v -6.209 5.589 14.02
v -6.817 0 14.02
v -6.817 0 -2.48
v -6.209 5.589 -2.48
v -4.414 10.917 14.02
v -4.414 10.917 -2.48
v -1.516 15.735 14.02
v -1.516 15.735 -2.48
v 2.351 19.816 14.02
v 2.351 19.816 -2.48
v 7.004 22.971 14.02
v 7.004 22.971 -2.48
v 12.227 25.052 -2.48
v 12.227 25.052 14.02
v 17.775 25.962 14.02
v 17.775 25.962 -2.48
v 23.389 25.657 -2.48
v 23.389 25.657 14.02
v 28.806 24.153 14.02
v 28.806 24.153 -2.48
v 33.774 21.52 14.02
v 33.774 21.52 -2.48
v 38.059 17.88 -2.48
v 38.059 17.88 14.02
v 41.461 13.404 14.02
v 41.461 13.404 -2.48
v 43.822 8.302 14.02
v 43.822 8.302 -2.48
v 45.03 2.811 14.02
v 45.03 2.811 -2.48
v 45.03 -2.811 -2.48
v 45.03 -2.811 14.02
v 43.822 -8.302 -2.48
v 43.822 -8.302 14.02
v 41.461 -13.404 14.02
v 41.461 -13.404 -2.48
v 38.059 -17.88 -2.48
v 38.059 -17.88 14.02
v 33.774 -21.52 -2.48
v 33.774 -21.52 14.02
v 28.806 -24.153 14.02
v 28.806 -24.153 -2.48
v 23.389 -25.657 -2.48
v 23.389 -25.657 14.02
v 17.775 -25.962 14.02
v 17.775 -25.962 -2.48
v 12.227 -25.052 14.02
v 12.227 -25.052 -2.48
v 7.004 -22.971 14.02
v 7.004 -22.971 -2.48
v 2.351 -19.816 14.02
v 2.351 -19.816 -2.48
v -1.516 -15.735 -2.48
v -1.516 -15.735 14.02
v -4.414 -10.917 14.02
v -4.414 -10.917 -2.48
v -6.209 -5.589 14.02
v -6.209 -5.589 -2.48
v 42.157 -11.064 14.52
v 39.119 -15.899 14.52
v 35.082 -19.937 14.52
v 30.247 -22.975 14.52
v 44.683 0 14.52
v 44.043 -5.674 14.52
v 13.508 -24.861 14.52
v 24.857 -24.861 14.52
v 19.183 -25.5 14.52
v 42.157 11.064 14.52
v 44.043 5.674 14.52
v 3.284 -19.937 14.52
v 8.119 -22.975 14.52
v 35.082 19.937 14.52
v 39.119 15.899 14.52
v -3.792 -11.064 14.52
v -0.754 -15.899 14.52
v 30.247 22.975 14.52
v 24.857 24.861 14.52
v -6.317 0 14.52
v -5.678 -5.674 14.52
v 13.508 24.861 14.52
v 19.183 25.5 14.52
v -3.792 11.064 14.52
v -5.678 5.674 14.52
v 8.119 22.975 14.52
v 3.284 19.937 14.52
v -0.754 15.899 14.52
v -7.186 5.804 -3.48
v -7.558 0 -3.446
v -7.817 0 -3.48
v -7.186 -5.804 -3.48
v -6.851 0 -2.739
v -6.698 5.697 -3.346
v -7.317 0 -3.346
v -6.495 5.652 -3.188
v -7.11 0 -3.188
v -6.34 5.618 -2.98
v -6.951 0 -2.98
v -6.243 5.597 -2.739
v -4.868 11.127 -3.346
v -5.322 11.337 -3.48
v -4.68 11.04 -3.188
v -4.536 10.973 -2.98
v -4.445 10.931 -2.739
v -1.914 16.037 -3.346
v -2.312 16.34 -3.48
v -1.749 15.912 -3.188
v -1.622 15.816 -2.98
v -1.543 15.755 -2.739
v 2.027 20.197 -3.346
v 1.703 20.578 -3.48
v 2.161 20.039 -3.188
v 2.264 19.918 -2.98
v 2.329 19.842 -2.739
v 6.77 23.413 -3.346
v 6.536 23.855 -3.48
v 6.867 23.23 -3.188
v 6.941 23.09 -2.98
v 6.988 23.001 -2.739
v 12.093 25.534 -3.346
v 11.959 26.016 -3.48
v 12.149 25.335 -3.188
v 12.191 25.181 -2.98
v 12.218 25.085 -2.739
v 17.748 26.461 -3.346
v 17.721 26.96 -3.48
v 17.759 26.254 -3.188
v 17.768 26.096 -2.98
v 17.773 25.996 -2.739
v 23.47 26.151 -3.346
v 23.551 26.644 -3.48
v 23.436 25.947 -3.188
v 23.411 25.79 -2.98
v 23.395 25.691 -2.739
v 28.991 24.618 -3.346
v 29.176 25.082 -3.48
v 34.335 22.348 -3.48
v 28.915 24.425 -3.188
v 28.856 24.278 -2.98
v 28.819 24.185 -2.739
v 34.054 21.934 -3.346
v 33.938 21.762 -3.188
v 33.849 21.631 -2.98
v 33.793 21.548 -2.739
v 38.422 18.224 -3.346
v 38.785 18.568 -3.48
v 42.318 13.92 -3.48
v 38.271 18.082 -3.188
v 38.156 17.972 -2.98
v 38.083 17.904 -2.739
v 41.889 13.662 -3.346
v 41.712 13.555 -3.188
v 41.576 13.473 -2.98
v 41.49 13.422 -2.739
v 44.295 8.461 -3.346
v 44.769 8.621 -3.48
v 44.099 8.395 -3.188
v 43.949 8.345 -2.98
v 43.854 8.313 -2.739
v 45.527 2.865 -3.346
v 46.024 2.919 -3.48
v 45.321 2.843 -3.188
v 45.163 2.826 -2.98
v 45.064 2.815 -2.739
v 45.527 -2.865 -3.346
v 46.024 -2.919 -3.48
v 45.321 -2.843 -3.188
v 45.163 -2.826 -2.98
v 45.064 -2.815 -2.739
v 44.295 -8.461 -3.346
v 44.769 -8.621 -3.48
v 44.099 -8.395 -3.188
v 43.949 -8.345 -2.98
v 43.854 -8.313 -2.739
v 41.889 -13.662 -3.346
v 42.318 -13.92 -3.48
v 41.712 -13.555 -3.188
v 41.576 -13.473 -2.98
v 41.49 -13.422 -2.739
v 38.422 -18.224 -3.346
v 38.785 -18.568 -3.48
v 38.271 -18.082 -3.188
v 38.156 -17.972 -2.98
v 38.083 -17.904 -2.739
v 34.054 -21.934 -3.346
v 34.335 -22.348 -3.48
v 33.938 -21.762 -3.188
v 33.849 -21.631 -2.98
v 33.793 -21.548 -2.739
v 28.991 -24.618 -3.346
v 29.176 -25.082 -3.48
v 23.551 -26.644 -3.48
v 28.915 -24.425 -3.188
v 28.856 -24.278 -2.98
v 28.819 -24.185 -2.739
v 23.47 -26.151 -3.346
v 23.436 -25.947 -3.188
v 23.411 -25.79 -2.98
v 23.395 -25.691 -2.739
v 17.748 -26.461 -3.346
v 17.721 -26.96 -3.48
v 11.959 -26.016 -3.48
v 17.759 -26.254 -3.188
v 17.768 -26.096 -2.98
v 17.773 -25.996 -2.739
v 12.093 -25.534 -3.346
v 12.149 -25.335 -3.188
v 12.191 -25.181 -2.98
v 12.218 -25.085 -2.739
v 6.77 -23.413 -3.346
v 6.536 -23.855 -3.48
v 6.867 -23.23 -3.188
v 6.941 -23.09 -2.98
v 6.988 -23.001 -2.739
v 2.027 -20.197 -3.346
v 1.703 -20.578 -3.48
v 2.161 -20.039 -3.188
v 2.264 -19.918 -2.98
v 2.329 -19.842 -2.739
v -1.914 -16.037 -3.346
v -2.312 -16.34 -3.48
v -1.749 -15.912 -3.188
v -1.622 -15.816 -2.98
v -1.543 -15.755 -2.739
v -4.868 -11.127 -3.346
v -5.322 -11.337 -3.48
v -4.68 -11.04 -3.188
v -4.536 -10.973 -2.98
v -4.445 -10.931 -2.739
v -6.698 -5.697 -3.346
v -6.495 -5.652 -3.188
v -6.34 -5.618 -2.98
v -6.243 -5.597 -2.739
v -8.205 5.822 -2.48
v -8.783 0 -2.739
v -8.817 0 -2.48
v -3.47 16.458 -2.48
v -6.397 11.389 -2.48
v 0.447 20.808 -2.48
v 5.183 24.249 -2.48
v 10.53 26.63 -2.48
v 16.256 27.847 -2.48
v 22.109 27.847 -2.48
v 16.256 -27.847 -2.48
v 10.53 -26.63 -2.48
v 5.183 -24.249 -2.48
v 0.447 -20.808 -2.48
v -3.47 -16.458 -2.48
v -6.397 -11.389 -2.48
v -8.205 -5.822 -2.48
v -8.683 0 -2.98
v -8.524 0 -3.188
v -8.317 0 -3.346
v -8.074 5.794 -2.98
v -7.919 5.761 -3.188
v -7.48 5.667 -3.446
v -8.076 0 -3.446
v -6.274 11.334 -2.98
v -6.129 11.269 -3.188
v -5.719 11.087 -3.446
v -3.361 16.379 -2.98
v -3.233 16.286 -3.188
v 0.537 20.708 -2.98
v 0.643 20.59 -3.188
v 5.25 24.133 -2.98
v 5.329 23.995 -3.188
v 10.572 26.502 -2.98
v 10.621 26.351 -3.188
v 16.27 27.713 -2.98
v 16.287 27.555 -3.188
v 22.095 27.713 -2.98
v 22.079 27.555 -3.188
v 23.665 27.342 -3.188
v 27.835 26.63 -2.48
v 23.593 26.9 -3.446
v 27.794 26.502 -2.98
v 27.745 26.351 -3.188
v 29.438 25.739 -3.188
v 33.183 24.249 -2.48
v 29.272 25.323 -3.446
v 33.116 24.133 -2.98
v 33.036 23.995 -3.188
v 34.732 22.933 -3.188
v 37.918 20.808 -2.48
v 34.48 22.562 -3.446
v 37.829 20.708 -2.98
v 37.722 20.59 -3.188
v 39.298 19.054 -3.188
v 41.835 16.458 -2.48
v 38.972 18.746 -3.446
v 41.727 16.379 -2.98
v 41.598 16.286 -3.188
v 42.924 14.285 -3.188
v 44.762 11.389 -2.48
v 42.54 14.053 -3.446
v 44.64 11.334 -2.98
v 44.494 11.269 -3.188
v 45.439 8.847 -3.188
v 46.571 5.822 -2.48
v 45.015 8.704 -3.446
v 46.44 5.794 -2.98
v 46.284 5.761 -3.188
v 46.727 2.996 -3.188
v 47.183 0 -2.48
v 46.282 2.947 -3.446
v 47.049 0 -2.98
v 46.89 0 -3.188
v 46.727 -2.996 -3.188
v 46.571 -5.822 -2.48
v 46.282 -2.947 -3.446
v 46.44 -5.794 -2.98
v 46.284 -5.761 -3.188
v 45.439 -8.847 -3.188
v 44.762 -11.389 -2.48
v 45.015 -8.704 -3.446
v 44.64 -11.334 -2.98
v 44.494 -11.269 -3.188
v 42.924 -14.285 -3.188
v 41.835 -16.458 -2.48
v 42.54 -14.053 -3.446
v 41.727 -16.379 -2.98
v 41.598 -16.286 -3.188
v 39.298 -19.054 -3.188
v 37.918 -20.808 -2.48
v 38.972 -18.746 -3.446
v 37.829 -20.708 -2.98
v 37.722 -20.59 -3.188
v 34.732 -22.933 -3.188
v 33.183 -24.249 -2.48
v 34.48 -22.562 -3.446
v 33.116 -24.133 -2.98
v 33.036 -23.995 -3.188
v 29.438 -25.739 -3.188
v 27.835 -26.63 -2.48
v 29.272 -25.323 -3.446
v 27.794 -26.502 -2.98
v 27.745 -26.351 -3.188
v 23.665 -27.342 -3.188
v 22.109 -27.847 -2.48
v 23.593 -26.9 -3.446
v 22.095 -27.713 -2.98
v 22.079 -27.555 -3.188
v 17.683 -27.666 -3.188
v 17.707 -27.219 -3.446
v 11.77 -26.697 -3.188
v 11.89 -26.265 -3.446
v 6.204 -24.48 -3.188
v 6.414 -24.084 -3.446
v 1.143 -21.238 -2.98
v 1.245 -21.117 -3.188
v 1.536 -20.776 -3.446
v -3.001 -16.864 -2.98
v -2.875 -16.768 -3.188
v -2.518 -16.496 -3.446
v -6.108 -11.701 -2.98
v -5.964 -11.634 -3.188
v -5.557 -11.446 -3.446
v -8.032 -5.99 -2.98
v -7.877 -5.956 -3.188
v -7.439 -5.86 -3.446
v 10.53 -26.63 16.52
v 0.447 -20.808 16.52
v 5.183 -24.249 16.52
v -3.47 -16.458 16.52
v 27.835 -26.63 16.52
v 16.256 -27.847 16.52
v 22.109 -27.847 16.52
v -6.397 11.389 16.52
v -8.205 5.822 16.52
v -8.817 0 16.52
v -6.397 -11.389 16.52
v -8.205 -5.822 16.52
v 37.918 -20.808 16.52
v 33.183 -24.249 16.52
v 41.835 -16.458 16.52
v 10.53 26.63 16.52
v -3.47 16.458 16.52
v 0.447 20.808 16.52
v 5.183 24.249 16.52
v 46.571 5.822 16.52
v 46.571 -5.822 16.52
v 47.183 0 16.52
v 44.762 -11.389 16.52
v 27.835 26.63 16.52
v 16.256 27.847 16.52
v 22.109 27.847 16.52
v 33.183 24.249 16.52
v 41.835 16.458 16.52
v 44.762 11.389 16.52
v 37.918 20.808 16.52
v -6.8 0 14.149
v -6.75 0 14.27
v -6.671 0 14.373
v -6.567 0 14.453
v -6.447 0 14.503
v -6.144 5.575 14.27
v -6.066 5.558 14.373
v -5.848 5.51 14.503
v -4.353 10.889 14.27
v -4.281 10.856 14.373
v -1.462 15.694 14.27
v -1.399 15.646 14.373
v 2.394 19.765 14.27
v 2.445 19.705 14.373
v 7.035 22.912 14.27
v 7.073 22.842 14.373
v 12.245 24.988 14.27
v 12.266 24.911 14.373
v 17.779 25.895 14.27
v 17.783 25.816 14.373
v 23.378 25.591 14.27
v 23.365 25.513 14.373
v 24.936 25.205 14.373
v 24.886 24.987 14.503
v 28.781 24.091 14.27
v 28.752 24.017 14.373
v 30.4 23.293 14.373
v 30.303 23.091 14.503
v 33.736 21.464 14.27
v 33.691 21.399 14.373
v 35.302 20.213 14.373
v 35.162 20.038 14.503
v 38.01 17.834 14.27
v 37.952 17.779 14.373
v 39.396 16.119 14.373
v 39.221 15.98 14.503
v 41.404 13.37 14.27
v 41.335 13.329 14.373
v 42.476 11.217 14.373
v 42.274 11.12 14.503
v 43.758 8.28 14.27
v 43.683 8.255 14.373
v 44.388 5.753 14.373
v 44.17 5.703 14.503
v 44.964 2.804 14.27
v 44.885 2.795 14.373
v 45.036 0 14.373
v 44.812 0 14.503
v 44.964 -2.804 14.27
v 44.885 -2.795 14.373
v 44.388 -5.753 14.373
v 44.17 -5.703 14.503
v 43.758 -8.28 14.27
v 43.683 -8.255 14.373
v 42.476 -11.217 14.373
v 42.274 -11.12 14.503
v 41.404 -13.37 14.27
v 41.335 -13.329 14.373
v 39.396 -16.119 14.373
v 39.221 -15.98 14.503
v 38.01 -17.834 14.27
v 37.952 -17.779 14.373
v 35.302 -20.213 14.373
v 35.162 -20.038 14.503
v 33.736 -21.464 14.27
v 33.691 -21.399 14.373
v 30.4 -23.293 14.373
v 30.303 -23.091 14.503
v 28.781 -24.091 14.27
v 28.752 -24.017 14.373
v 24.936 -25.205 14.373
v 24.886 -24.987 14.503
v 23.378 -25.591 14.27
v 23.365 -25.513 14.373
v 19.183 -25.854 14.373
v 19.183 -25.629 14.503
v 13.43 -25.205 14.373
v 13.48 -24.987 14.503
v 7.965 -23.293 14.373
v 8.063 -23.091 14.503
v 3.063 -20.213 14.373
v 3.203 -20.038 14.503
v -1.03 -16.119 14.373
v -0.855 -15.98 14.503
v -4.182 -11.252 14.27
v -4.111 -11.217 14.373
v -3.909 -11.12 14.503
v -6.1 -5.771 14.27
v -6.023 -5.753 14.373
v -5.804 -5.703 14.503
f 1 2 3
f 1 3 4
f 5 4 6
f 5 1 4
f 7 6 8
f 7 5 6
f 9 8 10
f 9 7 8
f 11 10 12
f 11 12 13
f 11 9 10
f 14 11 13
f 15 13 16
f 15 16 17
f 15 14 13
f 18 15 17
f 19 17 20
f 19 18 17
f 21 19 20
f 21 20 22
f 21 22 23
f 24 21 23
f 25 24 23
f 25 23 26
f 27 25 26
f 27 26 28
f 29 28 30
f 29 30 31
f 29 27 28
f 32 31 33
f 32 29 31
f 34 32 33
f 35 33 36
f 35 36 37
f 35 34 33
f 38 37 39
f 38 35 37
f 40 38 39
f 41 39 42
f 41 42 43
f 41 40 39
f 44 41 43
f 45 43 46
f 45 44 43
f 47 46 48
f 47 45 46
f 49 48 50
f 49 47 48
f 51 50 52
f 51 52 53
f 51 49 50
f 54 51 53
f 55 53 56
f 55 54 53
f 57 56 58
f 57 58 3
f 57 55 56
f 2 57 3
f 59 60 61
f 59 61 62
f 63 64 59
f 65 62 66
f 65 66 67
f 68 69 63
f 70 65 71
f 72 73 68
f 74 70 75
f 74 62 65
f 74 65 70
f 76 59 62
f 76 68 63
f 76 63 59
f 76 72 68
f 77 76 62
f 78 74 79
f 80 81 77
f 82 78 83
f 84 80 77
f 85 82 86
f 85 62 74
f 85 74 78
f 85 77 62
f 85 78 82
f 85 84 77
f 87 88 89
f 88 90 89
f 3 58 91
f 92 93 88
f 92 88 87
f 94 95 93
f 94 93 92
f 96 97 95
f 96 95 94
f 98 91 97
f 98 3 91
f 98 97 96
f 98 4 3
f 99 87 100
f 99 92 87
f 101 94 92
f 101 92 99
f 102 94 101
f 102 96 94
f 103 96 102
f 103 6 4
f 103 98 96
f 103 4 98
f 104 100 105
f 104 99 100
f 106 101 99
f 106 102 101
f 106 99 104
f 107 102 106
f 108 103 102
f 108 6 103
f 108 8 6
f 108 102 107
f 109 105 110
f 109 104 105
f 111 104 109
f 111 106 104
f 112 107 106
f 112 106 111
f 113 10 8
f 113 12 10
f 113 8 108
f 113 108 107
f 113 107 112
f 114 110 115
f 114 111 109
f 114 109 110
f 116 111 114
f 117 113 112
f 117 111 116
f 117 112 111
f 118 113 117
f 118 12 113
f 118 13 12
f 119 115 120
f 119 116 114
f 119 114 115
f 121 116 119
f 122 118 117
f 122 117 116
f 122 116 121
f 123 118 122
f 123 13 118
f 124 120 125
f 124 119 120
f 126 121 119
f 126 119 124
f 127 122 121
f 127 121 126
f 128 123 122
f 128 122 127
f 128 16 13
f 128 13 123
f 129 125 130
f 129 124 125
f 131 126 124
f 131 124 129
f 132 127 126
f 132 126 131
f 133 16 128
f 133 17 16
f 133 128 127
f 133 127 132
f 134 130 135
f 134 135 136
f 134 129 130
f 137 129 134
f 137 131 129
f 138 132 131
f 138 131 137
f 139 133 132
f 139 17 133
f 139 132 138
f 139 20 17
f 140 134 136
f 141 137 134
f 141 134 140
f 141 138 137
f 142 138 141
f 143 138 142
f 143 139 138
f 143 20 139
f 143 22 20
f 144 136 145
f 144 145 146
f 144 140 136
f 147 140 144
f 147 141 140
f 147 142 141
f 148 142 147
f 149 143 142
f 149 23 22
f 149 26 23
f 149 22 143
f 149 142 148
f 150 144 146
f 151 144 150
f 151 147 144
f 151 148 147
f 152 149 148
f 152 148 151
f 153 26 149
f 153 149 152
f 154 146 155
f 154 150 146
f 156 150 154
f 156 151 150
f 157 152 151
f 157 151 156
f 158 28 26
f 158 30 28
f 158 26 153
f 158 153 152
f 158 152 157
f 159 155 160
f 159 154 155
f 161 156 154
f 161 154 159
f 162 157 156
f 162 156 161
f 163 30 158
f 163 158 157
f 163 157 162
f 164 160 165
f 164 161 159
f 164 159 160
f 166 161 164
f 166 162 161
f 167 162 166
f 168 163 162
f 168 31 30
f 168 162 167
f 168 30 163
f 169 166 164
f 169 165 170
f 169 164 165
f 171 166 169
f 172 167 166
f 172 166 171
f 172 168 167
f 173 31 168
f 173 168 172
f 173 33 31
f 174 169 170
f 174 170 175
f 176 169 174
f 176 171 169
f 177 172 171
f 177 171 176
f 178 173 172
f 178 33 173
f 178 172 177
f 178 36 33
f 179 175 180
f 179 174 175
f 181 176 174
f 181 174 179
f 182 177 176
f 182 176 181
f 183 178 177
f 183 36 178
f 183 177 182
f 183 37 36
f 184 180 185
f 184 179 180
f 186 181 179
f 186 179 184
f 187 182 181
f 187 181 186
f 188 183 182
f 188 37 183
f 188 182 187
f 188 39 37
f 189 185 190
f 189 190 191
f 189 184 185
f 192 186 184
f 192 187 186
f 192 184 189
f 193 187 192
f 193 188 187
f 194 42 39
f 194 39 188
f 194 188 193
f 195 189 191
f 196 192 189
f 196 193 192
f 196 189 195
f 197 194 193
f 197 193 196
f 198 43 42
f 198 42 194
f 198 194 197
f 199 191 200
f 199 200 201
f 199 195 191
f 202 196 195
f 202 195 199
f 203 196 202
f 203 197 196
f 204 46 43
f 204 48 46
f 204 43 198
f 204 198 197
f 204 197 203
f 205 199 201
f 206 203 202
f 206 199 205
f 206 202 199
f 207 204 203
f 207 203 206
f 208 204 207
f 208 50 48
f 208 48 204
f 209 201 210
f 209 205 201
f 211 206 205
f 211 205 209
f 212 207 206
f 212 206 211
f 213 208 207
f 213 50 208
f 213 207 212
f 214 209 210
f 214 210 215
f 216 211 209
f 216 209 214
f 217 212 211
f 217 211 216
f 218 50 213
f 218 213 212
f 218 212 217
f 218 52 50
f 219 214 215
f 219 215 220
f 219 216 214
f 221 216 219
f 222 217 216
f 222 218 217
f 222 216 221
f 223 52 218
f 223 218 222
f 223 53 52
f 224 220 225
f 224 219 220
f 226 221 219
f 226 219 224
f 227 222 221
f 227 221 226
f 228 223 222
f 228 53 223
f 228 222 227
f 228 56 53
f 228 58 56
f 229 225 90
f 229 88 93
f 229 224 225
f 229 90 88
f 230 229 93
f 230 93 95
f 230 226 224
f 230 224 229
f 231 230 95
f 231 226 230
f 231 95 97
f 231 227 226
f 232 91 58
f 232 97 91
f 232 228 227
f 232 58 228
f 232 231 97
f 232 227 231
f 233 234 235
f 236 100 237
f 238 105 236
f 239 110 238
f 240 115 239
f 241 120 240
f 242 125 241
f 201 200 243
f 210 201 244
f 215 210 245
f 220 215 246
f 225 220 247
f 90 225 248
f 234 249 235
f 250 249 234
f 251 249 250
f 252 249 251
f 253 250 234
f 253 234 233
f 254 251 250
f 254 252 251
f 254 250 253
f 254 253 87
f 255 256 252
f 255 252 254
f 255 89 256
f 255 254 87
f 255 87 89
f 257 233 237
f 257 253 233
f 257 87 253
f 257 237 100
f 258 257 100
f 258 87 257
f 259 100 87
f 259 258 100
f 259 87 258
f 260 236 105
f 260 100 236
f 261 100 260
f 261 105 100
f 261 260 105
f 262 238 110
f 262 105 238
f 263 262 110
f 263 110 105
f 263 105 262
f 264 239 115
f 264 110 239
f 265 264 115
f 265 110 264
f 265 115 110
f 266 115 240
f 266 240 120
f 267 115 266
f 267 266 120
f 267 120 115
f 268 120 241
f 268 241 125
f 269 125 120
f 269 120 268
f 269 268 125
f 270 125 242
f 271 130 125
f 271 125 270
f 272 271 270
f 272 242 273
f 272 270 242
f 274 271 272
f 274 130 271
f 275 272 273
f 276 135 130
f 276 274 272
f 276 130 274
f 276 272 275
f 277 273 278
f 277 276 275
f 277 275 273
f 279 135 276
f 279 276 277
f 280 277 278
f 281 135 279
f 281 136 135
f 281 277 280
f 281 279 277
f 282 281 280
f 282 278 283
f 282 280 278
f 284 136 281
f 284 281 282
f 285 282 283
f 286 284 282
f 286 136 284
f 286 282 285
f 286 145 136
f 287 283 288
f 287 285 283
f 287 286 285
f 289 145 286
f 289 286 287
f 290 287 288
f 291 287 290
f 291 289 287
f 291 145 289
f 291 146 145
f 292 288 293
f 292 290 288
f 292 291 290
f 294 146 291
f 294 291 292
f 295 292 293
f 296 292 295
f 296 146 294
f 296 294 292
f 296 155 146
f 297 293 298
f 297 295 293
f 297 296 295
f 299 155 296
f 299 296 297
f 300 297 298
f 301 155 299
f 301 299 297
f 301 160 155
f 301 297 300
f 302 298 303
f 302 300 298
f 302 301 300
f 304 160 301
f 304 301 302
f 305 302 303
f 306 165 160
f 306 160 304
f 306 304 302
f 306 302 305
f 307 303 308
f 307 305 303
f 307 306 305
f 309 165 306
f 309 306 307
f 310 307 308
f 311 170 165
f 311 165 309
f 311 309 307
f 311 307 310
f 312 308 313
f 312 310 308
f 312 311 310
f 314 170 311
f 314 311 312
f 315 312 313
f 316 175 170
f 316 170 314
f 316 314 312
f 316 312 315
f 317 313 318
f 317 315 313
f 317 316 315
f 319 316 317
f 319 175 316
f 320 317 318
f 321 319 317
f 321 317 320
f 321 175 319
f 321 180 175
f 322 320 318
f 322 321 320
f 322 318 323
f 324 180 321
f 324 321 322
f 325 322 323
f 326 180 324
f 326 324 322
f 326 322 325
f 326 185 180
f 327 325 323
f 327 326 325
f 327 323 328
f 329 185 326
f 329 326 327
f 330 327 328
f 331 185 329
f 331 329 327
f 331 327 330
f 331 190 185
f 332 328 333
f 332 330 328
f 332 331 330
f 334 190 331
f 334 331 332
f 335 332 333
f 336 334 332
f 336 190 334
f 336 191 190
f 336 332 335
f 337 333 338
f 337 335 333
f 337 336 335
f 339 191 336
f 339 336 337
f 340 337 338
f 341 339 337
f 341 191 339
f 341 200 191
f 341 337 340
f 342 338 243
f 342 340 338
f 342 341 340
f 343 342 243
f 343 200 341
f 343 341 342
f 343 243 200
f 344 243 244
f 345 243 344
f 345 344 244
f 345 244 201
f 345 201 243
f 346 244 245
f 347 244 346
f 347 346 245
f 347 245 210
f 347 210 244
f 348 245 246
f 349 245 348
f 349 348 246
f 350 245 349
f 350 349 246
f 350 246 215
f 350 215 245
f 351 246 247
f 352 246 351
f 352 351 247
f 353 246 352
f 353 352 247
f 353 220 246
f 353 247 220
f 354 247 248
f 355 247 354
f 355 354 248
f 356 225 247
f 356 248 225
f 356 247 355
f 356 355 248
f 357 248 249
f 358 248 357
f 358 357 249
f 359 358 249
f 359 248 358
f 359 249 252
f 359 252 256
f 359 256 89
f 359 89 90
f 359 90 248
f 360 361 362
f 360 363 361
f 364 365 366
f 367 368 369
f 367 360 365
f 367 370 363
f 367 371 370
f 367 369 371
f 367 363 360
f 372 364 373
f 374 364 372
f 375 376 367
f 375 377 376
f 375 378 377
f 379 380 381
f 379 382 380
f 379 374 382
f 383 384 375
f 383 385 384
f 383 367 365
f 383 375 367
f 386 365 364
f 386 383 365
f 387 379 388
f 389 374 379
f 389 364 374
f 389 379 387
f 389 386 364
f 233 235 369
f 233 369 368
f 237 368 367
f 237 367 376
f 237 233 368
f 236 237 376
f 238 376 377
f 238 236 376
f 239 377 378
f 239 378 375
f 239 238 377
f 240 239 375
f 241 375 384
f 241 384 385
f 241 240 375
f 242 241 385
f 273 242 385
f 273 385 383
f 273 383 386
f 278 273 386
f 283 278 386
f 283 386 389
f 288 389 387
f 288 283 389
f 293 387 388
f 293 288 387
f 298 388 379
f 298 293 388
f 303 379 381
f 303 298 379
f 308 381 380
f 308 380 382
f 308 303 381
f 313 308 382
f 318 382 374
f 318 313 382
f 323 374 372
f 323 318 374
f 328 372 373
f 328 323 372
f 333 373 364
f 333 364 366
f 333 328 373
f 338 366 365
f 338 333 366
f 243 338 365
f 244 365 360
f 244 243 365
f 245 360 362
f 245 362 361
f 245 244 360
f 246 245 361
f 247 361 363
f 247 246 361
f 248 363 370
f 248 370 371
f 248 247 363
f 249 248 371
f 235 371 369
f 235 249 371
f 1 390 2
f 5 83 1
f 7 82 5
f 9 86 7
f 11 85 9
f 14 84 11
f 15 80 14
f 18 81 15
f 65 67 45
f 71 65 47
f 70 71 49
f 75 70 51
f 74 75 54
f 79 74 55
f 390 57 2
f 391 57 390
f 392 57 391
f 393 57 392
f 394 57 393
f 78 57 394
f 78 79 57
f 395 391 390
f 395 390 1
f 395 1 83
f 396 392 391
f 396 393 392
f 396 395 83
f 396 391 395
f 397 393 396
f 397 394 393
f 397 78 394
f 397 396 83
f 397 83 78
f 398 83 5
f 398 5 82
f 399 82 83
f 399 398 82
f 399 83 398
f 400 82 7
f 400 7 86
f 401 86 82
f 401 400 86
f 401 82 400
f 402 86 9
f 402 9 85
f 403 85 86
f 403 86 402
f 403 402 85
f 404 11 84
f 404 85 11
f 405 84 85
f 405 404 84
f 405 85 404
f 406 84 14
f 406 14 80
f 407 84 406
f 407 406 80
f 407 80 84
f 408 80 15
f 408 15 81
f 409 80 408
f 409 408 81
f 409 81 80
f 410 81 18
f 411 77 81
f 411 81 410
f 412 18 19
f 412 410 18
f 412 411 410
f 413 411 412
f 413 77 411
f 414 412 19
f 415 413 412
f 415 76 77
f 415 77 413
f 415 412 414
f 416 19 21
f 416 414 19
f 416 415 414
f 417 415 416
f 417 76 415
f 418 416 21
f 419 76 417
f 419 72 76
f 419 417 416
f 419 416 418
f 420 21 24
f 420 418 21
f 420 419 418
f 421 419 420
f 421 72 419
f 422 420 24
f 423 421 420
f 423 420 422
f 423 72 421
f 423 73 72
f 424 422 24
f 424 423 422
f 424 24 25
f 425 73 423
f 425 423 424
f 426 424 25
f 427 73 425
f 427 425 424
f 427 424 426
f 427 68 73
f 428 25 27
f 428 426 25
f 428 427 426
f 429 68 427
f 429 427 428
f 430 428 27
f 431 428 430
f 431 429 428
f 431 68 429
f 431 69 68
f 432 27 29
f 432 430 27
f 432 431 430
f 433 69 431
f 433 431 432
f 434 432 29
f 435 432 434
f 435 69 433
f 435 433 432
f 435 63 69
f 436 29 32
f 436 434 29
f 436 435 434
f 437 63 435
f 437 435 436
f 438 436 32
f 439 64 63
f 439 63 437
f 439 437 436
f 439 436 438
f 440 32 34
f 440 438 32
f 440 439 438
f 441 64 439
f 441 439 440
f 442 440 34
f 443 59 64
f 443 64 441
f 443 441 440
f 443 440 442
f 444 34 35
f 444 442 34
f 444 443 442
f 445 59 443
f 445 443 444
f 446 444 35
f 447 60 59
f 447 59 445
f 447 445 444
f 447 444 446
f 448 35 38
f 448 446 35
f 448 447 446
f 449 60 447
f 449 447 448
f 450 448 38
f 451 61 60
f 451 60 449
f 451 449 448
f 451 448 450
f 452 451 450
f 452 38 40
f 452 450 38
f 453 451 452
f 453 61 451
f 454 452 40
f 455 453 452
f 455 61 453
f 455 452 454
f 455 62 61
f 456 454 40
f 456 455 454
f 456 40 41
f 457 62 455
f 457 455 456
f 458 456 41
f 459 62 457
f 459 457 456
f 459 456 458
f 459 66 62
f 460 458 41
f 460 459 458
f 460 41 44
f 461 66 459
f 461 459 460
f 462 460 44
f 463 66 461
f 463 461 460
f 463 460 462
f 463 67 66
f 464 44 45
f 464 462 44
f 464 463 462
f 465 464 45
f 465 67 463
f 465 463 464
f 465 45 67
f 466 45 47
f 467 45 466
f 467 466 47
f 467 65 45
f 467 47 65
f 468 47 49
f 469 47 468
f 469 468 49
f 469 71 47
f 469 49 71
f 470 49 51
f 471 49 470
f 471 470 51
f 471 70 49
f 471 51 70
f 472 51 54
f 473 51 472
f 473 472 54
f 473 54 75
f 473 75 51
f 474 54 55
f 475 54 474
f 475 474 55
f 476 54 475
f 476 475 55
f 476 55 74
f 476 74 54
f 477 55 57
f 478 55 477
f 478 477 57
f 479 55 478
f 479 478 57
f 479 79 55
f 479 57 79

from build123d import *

# Parameters (mm, degrees)
F2_R = 0.99999
F3_R = 0.5


# Not quite as in the source:
# - a fillet or chamfer is up to 0.001 mm smaller than in the source, because OpenCascade refuses the exact size


with BuildPart() as f1:
    # F0 (on Front) → F1 (revolve)
    with BuildSketch(Plane.XZ):
        Polygon((19.1826918498, 16.5195801589), (-8.8173081502, 16.5195801589), (-8.8173081502, -3.4804198411), (-6.8173081502, -3.4804198411), (-6.8173081502, 14.5195801589), (19.1826918498, 14.5195801589), align=None)
    revolve(axis=Axis((19.1826918498, 0, 15.5195801589), (0, 0, -1)))

    # F2 (radius 1 in the source; OpenCascade refuses exactly that, so slightly less here)
    f2_edges = [f1.edges().sort_by_distance(p)[0] for p in [
        (47.182692, 0, -3.48042),
        (45.182692, 0, -3.48042),
    ]]
    fillet(f2_edges, radius=F2_R)

    # F3
    f3_edges = [f1.edges().sort_by_distance(p)[0] for p in [
        (45.182692, 0, 14.51958),
    ]]
    fillet(f3_edges, radius=F3_R)


solid = f1.part
